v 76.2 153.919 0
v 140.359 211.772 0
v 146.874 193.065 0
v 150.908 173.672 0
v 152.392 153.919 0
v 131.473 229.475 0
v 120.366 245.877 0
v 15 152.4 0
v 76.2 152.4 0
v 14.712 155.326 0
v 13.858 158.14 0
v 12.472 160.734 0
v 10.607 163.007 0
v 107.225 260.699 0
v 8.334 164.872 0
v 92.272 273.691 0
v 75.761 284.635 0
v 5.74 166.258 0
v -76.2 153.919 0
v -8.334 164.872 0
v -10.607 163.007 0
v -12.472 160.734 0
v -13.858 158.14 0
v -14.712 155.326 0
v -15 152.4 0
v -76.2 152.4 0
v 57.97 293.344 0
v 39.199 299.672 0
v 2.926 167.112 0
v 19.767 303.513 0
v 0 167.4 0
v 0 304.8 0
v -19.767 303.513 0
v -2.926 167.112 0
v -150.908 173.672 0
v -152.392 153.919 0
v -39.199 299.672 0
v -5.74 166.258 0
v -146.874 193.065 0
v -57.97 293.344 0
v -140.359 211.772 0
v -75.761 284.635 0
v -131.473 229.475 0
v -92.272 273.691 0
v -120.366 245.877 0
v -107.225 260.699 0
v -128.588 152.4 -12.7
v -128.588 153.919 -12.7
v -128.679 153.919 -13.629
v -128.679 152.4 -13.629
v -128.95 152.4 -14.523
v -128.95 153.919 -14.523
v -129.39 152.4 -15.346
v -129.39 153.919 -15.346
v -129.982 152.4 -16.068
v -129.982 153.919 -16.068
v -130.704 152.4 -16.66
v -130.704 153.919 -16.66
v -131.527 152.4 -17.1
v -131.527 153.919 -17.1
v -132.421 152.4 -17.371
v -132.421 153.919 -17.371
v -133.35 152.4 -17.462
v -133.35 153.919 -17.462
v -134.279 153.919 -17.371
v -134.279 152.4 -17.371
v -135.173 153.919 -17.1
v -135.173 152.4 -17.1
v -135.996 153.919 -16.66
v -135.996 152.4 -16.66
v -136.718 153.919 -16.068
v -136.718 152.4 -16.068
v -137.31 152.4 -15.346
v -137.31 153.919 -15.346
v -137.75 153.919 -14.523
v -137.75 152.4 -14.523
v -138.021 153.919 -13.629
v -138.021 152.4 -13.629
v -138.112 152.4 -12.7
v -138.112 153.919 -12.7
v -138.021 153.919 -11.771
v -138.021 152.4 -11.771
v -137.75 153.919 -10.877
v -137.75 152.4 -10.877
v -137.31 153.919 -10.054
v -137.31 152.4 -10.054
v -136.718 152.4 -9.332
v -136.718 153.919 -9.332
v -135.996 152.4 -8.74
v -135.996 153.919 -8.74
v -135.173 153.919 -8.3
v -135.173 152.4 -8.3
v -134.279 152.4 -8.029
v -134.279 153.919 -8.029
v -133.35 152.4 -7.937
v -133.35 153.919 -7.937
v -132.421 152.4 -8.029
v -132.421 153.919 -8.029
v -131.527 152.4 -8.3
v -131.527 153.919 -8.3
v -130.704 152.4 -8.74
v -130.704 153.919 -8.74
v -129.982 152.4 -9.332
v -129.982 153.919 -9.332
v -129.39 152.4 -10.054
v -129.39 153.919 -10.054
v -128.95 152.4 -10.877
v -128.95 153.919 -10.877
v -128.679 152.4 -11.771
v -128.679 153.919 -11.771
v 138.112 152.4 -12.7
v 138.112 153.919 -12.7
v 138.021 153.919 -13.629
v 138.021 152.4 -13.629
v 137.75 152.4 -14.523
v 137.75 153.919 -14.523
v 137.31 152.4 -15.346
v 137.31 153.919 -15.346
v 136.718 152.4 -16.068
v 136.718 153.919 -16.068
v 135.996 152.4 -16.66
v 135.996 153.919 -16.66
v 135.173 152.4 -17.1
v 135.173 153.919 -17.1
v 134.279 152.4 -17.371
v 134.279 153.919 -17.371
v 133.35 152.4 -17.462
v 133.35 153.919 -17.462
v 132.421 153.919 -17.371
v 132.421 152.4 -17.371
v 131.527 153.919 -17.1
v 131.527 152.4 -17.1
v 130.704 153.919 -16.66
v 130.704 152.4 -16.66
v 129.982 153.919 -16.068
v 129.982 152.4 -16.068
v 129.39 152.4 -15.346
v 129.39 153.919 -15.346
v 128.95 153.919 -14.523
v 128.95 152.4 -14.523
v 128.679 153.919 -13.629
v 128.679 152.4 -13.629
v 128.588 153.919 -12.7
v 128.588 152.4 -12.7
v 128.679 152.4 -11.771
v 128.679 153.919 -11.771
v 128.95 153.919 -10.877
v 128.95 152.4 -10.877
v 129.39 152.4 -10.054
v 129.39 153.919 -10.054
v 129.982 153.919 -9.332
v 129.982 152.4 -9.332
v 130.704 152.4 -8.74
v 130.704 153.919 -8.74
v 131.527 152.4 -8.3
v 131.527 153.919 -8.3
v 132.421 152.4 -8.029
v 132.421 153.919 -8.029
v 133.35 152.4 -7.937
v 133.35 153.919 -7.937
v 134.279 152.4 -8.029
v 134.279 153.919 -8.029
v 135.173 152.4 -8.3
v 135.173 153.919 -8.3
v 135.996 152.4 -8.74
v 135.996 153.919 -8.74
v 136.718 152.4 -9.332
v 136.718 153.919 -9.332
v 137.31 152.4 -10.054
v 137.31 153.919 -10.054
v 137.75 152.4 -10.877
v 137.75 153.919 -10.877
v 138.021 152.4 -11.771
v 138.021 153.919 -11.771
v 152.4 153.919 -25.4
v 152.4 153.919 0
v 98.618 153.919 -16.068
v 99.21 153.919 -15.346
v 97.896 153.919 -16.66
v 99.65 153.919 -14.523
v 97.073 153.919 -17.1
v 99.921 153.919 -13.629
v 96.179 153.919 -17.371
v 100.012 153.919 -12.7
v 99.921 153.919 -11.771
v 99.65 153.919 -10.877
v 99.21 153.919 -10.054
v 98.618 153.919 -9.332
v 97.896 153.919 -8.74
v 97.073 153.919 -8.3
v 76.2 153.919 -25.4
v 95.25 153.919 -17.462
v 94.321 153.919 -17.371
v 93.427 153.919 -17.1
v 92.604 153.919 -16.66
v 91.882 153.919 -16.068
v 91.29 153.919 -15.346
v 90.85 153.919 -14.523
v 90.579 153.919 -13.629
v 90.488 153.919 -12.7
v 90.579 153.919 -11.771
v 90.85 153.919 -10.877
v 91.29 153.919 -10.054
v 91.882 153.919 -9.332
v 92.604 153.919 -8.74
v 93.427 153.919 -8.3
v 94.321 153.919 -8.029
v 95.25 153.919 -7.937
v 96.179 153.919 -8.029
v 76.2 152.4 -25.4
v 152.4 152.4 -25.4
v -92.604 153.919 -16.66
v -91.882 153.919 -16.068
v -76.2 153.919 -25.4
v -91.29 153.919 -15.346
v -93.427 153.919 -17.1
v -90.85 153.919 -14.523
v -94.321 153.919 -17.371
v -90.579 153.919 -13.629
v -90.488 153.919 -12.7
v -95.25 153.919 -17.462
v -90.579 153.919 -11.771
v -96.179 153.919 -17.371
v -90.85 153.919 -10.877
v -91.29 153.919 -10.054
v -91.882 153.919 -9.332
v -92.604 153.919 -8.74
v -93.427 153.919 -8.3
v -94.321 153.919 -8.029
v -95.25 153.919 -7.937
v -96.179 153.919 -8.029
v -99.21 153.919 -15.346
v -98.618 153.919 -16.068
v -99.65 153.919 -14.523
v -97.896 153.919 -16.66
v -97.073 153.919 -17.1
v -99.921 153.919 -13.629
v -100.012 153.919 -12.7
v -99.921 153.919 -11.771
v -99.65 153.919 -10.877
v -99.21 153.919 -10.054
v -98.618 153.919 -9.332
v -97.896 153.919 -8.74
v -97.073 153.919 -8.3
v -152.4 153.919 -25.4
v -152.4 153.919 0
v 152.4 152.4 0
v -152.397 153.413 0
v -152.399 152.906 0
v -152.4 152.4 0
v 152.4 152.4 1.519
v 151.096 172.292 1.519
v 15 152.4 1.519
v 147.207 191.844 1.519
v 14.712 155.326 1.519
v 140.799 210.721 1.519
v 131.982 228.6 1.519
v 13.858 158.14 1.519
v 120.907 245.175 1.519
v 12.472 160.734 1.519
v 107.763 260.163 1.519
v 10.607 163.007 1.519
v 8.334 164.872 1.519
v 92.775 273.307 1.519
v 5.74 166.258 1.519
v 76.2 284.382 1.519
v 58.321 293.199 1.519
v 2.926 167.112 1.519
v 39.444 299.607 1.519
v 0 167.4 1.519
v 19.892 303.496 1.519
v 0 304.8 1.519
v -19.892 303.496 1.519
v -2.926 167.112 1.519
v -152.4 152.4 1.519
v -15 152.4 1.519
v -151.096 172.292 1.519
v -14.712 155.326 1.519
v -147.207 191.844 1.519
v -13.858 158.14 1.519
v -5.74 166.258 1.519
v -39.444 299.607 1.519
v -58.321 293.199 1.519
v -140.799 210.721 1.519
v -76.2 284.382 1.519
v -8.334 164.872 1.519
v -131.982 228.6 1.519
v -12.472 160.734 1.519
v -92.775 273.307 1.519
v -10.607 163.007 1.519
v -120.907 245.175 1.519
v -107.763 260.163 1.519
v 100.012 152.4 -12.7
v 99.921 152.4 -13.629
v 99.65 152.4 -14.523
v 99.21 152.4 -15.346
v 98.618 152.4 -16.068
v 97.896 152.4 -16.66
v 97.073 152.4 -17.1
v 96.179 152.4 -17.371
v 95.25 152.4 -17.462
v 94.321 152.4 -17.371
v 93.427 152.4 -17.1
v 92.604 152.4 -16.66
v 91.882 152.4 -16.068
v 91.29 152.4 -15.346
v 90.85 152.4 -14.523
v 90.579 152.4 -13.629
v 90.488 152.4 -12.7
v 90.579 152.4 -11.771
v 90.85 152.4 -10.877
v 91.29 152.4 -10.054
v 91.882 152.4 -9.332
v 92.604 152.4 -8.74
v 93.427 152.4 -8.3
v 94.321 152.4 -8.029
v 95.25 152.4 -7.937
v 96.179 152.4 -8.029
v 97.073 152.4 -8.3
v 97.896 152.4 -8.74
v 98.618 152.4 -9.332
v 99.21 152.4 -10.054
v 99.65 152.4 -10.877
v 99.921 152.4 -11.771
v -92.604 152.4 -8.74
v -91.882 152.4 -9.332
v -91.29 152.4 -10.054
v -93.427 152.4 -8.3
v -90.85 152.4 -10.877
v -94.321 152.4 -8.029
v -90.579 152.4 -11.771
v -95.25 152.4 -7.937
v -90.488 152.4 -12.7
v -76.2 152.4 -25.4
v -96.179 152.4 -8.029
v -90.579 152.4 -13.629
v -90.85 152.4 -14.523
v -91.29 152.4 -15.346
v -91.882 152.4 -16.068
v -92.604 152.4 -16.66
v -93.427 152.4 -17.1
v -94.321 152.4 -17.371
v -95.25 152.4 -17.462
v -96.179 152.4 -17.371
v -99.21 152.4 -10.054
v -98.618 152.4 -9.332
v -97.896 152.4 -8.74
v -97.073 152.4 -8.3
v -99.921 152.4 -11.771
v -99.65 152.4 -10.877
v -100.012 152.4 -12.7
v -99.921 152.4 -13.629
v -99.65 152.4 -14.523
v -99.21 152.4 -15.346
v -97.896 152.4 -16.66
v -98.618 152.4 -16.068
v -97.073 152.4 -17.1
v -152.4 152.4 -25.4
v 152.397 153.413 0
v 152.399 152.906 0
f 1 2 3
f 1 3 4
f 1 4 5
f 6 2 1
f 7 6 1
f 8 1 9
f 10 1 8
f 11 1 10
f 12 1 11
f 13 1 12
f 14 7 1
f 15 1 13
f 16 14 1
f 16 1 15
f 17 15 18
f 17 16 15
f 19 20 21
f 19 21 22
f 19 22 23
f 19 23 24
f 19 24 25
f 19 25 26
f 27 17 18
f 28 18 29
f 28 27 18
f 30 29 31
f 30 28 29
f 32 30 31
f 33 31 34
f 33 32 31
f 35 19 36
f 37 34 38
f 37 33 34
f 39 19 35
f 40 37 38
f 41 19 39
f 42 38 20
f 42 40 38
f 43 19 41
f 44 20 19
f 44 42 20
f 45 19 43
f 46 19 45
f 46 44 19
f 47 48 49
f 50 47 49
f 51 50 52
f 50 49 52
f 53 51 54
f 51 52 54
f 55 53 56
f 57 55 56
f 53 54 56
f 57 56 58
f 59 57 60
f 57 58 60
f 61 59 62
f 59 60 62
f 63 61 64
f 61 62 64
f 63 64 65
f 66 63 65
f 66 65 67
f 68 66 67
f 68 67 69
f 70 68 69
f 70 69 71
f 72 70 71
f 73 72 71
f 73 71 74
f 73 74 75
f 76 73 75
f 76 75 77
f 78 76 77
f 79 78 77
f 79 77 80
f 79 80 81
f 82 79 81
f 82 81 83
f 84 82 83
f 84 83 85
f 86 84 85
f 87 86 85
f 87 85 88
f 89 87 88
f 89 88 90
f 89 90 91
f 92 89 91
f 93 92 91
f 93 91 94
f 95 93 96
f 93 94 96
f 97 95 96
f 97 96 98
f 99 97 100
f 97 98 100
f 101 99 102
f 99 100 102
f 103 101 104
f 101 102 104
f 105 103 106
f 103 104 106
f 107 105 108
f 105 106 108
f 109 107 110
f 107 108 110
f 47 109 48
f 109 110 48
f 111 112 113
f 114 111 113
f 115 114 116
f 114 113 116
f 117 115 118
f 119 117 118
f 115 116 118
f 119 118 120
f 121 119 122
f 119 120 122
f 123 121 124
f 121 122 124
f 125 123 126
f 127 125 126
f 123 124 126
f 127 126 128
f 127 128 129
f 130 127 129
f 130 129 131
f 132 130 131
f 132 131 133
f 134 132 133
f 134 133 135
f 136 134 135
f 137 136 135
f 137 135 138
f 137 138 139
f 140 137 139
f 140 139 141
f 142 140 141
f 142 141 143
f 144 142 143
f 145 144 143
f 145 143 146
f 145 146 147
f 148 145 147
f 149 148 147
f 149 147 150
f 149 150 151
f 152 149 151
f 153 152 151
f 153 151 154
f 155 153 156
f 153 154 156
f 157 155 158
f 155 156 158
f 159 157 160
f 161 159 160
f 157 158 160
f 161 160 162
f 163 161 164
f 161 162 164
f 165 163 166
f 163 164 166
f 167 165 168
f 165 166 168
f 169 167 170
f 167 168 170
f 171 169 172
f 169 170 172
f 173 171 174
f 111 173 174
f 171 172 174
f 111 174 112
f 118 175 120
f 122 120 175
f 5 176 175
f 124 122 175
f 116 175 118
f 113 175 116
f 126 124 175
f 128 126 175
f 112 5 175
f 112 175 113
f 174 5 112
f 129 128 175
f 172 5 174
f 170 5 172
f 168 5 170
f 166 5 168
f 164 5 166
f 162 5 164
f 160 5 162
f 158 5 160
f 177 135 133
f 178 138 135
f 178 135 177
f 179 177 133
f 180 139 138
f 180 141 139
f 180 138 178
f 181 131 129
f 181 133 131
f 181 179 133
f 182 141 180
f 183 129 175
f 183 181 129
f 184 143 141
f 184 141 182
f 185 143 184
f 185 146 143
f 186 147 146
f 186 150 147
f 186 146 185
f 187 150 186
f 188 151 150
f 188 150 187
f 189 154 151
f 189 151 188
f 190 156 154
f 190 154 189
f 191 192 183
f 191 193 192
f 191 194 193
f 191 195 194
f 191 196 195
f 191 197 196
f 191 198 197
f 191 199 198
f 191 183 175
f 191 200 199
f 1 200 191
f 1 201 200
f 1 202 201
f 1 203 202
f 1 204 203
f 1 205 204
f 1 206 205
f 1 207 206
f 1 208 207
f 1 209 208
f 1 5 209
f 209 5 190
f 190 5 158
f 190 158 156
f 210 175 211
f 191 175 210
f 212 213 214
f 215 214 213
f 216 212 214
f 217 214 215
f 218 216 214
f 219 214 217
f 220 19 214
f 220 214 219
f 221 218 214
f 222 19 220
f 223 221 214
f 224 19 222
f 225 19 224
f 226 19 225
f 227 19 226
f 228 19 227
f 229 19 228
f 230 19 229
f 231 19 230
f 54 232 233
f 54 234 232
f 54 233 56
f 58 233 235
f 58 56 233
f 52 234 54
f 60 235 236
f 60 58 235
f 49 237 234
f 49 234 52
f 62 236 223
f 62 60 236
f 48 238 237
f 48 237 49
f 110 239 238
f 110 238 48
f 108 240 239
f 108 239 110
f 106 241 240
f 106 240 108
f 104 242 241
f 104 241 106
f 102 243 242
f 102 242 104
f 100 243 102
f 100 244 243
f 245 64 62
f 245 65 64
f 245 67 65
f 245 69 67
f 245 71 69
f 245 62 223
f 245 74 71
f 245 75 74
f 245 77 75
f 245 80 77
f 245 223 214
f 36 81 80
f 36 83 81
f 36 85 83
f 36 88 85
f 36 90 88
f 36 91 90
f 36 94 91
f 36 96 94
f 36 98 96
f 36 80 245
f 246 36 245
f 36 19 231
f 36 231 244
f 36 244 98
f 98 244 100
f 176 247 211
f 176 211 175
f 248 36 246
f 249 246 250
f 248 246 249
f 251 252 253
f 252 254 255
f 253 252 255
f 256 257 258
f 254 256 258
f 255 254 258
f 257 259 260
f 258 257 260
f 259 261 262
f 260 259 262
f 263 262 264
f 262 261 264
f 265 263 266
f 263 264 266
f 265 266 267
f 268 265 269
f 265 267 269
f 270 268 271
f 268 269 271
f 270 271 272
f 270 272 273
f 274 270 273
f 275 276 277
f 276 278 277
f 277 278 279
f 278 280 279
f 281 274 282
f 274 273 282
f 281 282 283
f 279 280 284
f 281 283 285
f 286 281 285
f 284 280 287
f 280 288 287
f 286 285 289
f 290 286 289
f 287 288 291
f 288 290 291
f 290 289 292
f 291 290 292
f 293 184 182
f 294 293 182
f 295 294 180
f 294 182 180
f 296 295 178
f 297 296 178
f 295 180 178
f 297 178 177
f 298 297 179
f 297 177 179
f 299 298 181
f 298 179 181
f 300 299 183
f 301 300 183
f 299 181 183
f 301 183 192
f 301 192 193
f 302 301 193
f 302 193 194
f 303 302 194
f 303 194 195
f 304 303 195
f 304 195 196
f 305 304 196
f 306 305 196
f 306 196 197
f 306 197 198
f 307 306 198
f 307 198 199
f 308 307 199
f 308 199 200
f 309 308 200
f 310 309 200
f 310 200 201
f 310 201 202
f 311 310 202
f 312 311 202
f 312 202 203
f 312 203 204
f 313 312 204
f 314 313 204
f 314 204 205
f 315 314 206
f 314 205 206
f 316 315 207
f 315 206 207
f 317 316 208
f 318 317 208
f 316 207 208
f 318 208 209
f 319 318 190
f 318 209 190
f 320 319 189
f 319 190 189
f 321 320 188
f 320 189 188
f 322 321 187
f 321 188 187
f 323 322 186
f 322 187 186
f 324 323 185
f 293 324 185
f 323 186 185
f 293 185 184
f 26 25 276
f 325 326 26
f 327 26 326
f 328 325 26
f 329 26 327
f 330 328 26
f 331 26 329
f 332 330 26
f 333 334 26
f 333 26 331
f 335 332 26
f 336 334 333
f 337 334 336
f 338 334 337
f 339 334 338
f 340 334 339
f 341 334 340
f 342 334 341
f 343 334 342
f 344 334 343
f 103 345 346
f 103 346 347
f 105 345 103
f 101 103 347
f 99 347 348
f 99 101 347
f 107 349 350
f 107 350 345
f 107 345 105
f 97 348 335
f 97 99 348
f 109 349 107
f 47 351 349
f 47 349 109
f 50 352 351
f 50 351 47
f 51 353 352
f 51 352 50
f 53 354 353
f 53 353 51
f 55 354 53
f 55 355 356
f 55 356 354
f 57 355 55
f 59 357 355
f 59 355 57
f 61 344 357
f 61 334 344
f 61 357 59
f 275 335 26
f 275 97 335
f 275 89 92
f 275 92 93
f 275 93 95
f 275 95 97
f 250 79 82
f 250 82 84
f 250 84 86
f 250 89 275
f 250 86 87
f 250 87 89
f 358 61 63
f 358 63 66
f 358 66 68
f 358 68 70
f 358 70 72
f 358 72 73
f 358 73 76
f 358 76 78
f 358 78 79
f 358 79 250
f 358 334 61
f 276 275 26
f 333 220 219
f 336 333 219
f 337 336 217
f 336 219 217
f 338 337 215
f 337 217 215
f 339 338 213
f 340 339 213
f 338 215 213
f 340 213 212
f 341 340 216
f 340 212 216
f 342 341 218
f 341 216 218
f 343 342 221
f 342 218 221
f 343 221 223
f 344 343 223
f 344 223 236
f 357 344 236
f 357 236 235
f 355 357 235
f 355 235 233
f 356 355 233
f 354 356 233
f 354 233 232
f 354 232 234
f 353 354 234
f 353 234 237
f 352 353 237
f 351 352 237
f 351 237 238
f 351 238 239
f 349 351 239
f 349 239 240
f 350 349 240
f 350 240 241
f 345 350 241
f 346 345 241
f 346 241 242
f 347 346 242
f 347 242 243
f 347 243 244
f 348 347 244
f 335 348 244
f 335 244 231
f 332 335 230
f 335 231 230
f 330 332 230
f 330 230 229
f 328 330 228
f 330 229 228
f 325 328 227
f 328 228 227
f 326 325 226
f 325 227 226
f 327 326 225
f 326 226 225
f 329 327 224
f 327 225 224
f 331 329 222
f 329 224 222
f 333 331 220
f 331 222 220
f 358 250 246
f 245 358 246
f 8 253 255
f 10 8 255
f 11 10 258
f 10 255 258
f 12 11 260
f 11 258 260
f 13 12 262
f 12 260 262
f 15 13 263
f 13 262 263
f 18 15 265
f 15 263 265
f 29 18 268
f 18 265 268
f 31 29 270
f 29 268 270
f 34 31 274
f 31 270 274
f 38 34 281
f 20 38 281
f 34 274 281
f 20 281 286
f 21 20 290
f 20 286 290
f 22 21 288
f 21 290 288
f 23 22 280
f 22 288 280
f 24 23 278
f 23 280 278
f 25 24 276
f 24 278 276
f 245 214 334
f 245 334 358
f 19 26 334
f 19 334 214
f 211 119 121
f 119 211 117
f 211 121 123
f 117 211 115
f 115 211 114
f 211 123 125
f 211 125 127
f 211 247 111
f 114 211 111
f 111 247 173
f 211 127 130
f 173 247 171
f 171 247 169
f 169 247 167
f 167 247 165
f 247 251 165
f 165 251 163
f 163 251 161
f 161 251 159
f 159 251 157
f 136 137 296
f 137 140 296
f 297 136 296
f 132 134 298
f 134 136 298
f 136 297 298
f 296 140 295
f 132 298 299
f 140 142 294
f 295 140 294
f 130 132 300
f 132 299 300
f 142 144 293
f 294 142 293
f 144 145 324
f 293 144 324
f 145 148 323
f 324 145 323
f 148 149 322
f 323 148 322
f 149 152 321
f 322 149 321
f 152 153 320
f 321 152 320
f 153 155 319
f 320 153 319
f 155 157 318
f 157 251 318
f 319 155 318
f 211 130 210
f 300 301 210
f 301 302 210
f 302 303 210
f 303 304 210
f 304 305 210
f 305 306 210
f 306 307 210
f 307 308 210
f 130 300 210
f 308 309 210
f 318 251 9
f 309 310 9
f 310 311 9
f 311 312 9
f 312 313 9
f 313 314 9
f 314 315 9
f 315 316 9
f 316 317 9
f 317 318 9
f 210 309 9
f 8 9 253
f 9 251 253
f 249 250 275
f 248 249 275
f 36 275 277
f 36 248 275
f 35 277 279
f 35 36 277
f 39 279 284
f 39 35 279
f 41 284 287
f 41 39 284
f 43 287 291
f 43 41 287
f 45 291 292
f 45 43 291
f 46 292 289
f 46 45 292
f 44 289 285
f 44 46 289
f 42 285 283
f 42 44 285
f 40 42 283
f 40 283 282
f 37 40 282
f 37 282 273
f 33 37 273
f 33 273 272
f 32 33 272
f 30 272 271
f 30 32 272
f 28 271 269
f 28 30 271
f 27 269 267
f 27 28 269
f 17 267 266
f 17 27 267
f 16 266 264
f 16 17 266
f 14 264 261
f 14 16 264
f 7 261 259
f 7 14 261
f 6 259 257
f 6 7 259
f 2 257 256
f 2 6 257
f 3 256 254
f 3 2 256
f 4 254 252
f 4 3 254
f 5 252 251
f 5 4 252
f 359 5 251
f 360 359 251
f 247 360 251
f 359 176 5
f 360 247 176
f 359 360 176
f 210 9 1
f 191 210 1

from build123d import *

# Parameters (mm, degrees)
OUTER_CASING_DEPTH  = 1.51892
SKETCH1_R           = 15
INNER_CUTOUT_DEPTH  = 20
SKETCH4_W           = 76.2
SKETCH4_H           = 1.51892
BOSS_EXTRUDE1_DEPTH = 25.4
SKETCH5_R           = 4.7625
CUT_EXTRUDE1_DEPTH  = 2.51892


with BuildPart() as part:
    # Plate shape → Outer casing (new body)
    with BuildSketch(Plane.XY):
        with BuildLine():
            Line((0, 152.4), (-152.4, 152.4))
            ThreePointArc((-152.4, 152.4), (0, 304.8), (152.4, 152.4))
            Line((152.4, 152.4), (0, 152.4))
        make_face()
    extrude(amount=OUTER_CASING_DEPTH)

    # Sketch1 → Inner Cutout (cut)
    with BuildSketch(Plane.XY.offset(1.51892)):
        with Locations((0, 152.4)):
            Circle(SKETCH1_R)
    extrude(amount=-INNER_CUTOUT_DEPTH, mode=Mode.SUBTRACT)

    # Sketch4 → Boss-Extrude1 (add)
    with BuildSketch(Plane(origin=(0, 0, 0), x_dir=(-1, 0, 0), z_dir=(0, 0, -1))):
        with Locations((-114.3, 153.15946)):
            Rectangle(SKETCH4_W, SKETCH4_H)
        with Locations((114.3, 153.15946)):
            Rectangle(SKETCH4_W, SKETCH4_H)
    extrude(amount=BOSS_EXTRUDE1_DEPTH)

    # Sketch5 → Cut-Extrude1 (cut, through all)
    with BuildSketch(Plane(origin=(0, 153.91892, 0), x_dir=(1, 0, 0), z_dir=(0, 1, 0))):
        with Locations((133.35, 12.7)):
            Circle(SKETCH5_R)
        with Locations((95.25, 12.7)):
            Circle(SKETCH5_R)
        with Locations((-133.35, 12.7)):
            Circle(SKETCH5_R)
        with Locations((-95.25, 12.7)):
            Circle(SKETCH5_R)
    extrude(amount=-CUT_EXTRUDE1_DEPTH, mode=Mode.SUBTRACT)


solid = part.part
